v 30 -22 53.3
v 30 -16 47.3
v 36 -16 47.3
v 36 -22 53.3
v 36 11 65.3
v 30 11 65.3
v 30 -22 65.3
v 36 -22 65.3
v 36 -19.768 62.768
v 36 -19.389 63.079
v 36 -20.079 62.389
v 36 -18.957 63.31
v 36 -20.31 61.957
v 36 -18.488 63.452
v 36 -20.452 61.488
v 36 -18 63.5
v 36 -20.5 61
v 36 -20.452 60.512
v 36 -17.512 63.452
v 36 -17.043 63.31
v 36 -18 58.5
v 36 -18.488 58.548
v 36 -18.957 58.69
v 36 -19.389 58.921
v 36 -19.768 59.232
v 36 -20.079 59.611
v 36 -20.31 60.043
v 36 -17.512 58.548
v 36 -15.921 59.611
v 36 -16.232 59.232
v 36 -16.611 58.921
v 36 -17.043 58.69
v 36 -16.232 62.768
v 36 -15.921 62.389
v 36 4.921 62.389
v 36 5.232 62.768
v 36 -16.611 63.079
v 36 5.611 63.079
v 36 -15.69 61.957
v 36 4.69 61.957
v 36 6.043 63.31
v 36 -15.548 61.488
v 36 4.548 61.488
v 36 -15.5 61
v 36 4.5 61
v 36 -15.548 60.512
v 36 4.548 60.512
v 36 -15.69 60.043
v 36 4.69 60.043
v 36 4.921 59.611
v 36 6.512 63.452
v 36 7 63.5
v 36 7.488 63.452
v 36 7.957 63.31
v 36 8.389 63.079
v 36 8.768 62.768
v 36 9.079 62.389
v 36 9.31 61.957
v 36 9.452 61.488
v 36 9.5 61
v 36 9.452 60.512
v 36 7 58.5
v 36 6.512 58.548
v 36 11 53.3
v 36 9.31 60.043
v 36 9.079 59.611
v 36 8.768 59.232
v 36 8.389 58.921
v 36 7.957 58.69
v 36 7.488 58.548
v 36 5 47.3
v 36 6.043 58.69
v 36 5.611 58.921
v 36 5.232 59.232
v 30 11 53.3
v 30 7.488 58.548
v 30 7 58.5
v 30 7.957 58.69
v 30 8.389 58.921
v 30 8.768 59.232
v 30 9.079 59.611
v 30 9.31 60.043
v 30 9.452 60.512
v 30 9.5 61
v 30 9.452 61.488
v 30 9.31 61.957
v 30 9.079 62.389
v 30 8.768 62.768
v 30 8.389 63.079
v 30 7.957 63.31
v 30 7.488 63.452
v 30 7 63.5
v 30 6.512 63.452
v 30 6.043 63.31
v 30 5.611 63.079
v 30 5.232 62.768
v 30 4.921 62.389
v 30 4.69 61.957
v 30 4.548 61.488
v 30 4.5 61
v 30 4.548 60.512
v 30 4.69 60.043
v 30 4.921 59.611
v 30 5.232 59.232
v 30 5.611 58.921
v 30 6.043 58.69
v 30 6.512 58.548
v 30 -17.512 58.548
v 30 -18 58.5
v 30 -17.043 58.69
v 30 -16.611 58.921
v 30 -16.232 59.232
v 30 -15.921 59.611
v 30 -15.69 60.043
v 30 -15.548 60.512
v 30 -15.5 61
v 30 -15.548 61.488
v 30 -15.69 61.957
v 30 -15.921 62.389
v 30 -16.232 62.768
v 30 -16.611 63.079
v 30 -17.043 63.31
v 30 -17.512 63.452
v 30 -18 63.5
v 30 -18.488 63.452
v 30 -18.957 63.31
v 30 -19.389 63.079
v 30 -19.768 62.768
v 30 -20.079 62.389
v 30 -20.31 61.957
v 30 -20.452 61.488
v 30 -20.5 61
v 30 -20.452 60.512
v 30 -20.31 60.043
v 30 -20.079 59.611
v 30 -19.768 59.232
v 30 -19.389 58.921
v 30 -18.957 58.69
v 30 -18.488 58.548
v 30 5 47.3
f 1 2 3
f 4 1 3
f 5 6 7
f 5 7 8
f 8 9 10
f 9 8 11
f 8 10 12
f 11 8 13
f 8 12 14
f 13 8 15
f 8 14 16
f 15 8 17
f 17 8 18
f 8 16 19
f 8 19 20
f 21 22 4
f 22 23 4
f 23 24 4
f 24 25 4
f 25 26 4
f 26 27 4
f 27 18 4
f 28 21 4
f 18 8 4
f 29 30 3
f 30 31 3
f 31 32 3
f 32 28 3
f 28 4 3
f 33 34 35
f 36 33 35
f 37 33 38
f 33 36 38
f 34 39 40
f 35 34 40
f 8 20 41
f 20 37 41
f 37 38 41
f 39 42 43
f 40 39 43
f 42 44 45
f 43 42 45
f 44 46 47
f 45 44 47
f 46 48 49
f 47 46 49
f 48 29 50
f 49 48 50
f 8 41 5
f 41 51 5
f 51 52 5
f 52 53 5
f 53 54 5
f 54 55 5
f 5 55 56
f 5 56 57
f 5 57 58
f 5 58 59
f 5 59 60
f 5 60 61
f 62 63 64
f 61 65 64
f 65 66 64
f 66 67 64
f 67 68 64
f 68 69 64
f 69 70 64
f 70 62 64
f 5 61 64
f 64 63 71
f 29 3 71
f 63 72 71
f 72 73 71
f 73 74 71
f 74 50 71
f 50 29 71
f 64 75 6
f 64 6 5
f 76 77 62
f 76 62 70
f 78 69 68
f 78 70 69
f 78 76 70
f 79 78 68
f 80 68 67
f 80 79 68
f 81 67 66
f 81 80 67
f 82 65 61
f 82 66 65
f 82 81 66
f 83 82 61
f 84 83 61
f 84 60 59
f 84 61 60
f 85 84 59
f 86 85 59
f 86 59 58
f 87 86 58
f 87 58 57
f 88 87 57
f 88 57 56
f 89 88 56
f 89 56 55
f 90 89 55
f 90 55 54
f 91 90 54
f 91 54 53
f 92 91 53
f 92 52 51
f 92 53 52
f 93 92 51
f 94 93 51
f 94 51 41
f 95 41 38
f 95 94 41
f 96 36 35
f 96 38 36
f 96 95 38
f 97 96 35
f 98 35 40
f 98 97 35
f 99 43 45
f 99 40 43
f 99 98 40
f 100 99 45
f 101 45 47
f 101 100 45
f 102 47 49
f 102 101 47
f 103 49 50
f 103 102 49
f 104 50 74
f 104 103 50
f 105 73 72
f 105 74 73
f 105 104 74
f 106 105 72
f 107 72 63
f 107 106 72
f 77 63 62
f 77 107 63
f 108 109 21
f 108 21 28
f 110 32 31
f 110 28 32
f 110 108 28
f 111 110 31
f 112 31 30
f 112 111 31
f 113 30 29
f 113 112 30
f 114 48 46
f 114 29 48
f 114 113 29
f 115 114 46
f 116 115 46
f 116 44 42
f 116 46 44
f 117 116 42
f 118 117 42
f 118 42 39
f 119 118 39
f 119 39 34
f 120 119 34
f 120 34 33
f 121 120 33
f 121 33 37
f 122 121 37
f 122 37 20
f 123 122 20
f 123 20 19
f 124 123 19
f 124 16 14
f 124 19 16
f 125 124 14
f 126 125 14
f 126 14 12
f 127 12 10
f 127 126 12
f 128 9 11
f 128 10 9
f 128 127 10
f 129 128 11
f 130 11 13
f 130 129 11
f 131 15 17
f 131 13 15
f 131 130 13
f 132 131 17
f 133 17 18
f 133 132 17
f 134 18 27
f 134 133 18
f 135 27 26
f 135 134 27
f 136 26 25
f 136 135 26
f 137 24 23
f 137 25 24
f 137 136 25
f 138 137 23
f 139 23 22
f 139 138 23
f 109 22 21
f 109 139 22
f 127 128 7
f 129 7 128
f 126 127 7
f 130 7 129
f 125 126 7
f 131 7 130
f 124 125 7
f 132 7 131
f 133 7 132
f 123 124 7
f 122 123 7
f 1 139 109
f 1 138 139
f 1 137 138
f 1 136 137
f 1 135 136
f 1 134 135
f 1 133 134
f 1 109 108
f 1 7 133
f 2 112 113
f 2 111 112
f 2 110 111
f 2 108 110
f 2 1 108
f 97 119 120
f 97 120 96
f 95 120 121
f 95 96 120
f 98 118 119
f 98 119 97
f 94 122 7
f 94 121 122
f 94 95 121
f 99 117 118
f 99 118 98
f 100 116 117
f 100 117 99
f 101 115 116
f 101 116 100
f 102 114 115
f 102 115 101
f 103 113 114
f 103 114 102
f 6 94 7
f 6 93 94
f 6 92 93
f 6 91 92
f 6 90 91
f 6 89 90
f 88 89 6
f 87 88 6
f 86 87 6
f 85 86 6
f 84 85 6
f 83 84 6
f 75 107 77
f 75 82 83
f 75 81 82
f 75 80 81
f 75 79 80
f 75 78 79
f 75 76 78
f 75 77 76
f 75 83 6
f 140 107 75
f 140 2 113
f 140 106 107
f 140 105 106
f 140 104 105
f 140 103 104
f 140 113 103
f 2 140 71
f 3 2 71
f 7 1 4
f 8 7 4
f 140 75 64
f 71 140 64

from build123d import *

# Parameters (mm, degrees)
CYLINDER_R              = 2.5
CYLINDER_DEPTH          = 10
CYLINDER_PITCH_ANGLE    = 90
CYLINDER001_R           = 2.5
CYLINDER001_DEPTH       = 10
CYLINDER001_PITCH_ANGLE = 90
BOX_W                   = 6
BOX_H                   = 33
BOX_DEPTH               = 18
CHAMFER_SIZE            = 6


with BuildPart() as cilindro:
    # Cylinder → Cylinder (new body)
    with BuildSketch(Plane.XY):
        Circle(CYLINDER_R)
    extrude(amount=CYLINDER_DEPTH)


with BuildPart() as cilindro_1:
    # Cylinder pitch: moved
    add(cilindro.part.rotate(Axis((0, 0, 0), (0, 1, 0)), CYLINDER_PITCH_ANGLE))


with BuildPart() as cilindro_2:
    # Cylinder placement: moved
    add(cilindro_1.part.moved(Location((28, 7, 61))))


with BuildPart() as fusion:
    # Cylinder001 → Cylinder001 (new body)
    with BuildSketch(Plane.XY):
        Circle(CYLINDER001_R)
    extrude(amount=CYLINDER001_DEPTH)


with BuildPart() as fusion_1:
    # Cylinder001 pitch: moved
    add(fusion.part.rotate(Axis((0, 0, 0), (0, 1, 0)), CYLINDER001_PITCH_ANGLE))


with BuildPart() as fusion_2:
    # Cylinder001 placement: moved
    add(fusion_1.part.moved(Location((28, -18, 61))))

    # Fusion: union Cilindro
    add(cilindro_2.part)


with BuildPart() as soporte_leds:
    # Box → Box (new body)
    with BuildSketch(Plane(origin=(30, -22, 47.3), x_dir=(1, 0, 0), z_dir=(0, 0, 1))):
        with Locations((3, 16.5)):
            Rectangle(BOX_W, BOX_H)
    extrude(amount=BOX_DEPTH)

    # Chamfer
    chamfer_edges = [soporte_leds.edges().sort_by_distance(p)[0] for p in [
        (33, -22, 47.3),
        (33, 11, 47.3),
    ]]
    chamfer(chamfer_edges, length=CHAMFER_SIZE)

    # Cut: cut Fusion
    add(fusion_2.part, mode=Mode.SUBTRACT)


solid = soporte_leds.part
